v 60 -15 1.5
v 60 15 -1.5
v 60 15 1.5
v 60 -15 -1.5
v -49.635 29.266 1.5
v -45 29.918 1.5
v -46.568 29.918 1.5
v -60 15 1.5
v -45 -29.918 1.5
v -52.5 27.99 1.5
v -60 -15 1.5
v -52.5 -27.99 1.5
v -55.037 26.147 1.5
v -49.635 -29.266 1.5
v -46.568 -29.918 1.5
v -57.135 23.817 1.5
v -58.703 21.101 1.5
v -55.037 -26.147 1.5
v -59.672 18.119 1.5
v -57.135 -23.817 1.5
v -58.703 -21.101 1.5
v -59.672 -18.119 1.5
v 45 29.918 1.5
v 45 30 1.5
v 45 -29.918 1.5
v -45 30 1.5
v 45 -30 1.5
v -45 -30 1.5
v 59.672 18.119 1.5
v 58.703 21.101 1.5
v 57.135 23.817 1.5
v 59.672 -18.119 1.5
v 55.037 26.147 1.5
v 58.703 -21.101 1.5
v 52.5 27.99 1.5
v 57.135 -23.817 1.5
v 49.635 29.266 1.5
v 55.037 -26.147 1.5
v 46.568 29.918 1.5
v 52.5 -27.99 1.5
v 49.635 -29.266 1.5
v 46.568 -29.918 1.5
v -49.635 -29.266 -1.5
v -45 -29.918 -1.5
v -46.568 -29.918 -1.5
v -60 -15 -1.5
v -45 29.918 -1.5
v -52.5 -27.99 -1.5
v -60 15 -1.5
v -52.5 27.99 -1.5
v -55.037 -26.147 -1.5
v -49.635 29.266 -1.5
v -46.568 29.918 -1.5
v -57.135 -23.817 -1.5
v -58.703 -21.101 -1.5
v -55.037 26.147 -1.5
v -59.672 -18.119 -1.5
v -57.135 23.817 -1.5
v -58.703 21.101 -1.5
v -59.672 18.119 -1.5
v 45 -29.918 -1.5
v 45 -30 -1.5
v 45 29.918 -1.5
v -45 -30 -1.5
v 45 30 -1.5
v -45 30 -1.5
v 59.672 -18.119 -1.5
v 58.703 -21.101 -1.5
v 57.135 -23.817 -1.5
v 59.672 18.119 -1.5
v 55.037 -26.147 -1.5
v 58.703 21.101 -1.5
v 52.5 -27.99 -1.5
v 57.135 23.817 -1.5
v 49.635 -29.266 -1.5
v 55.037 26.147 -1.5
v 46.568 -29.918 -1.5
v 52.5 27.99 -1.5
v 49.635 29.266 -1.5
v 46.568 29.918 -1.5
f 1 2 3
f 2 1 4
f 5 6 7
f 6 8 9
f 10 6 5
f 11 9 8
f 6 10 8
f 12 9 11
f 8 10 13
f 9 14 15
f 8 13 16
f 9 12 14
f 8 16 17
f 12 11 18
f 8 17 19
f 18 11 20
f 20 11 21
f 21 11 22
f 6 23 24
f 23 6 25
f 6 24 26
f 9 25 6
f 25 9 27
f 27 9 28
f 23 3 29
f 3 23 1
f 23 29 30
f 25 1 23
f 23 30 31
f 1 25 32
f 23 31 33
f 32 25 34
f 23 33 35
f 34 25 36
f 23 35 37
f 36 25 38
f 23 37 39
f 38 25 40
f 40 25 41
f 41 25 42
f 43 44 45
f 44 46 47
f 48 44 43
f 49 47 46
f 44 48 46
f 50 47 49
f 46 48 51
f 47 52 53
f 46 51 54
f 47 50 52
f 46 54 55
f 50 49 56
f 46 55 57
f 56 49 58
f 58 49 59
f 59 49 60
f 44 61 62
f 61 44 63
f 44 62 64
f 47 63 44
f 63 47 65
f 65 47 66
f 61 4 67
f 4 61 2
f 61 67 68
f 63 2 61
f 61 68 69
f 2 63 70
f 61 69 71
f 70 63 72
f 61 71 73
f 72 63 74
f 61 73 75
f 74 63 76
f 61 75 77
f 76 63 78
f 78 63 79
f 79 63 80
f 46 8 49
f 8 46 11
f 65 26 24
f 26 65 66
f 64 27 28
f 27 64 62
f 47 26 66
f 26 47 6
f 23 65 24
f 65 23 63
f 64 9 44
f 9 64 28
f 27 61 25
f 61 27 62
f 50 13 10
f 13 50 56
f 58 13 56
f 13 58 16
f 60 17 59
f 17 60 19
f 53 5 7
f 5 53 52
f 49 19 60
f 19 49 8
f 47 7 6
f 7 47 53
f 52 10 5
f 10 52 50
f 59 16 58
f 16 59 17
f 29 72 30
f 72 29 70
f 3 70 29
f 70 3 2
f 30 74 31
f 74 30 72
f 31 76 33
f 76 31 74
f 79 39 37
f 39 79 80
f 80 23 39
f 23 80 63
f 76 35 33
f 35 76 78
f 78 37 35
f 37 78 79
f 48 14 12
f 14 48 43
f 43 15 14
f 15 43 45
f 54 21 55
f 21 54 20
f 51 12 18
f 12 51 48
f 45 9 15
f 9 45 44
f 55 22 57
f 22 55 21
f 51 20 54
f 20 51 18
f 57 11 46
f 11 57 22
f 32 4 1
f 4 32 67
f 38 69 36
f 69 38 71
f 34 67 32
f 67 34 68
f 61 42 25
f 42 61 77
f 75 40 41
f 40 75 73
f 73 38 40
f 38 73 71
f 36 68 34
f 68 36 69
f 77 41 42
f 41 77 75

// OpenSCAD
/*
 *  OpenSCAD Shapes Library (www.openscad.at)
 *  Copyright (C) 2009  Catarina Mota <clifford@clifford.at>
 *
 *  This program is free software; you can redistribute it and/or modify
 *  it under the terms of the GNU General Public License as published by
 *  the Free Software Foundation; either version 2 of the License, or
 *  (at your option) any later version.
 *
 *  This program is distributed in the hope that it will be useful,
 *  but WITHOUT ANY WARRANTY; without even the implied warranty of
 *  MERCHANTABILITY or FITNESS FOR A PARTICULAR PURPOSE.  See the
 *  GNU General Public License for more details.
 *
 *  You should have received a copy of the GNU General Public License
 *  along with this program; if not, write to the Free Software
 *  Foundation, Inc., 59 Temple Place, Suite 330, Boston, MA  02111-1307  USA
 *
*/


//box(width, height, depth);
//roundedBox(width, height, depth, factor);
//cone(height, radius);
//oval(width, height, depth);
//tube(height, radius, wall);
//ovalTube(width, height, depth, wall);
//hexagon(height, depth);
//octagon(height, depth);
//dodecagon(height, depth);
//hexagram(height, depth);
//rightTriangle(adjacent, opposite, depth);
//equiTriangle(side, depth);
//12ptStar(height, depth);

//----------------------

roundedBox(120, 60, 3, 8);

//----------------------

module box(w,h,d) {
	scale ([w,h,d]) cube(1, true);
}

module roundedBox(w,h,d,f){
	difference(){
		box(w,h,d);
		translate([-w/2,h/2,0]) cube(w/(f/2),true);
		translate([w/2,h/2,0]) cube(w/(f/2),true);
		translate([-w/2,-h/2,0]) cube(w/(f/2),true);
		translate([w/2,-h/2,0]) cube(w/(f/2),true);
	}
	translate([-w/2+w/f,h/2-w/f,-d/2]) cylinder(d,w/f, w/f);
	translate([w/2-w/f,h/2-w/f,-d/2]) cylinder(d,w/f, w/f);
	translate([-w/2+w/f,-h/2+w/f,-d/2]) cylinder(d,w/f, w/f);
	translate([w/2-w/f,-h/2+w/f,-d/2]) cylinder(d,w/f, w/f);
}

module cone(height, radius) {
		cylinder(height, radius, 0);
}

module oval(w,h,d) {
	scale ([w/100, h/100, 1]) cylinder(d, 50, 50);
}

module tube(height, radius, wall) {
	difference(){
		cylinder(height, radius, radius);
		cylinder(height, radius-wall, radius-wall);
	}
}

module ovalTube(w,h,d,wall) {
	difference(){
		scale ([w/100, h/100, 1]) cylinder(d, 50, 50);
		scale ([w/100, h/100, 1]) cylinder(d, 50-wall, 50-wall);
	}
}

module hexagon(height, depth) {
	boxWidth=height/1.75;
		union(){
			box(boxWidth, height, depth);
			rotate([0,0,60]) box(boxWidth, height, depth);
			rotate([0,0,-60]) box(boxWidth, height, depth);
		}
}

module octagon(height, depth) {
	intersection(){
		box(height, height, depth);
		rotate([0,0,45]) box(height, height, depth);
	}
}

module dodecagon(height, depth) {
	intersection(){
		hexagon(height, depth);
		rotate([0,0,90]) hexagon(height, depth);
	}
}

module hexagram(height, depth) {
	boxWidth=height/1.75;
	intersection(){
		box(height, boxWidth, depth);
		rotate([0,0,60]) box(height, boxWidth, depth);
	}
	intersection(){
		box(height, boxWidth, depth);
		rotate([0,0,-60]) box(height, boxWidth, depth);
	}
	intersection(){
		rotate([0,0,60]) box(height, boxWidth, depth);
		rotate([0,0,-60]) box(height, boxWidth, depth);
	}
}

module rightTriangle(adjacent, opposite, depth) {
	difference(){
		translate([-adjacent/2,opposite/2,0]) box(adjacent, opposite, depth);
		translate([-adjacent,0,0]){
			rotate([0,0,atan(opposite/adjacent)]) dislocateBox(adjacent*2, opposite, depth);
		}
	}
}

module equiTriangle(side, depth) {
	difference(){
		translate([-side/2,side/2,0]) box(side, side, depth);
		rotate([0,0,30]) dislocateBox(side*2, side, depth);
		translate([-side,0,0]){
			rotate([0,0,60]) dislocateBox(side*2, side, depth);
		}
	}
}

module 12ptStar(height, depth) {
	starNum=3;
	starAngle=360/starNum;
	for (s=[1:starNum]){
		rotate([0, 0, s*starAngle]) box(height, height, depth);
	}
}

//-----------------------
//MOVES THE ROTATION AXIS OF A BOX FROM ITS CENTER TO THE BOTTOM LEFT CORNER
module dislocateBox(w,h,d){
	translate([w/2,h,0]){
		difference(){
			box(w, h*2, d+1);
			translate([-w,0,0]) box(w, h*2, d+1);
		}
	}
}
